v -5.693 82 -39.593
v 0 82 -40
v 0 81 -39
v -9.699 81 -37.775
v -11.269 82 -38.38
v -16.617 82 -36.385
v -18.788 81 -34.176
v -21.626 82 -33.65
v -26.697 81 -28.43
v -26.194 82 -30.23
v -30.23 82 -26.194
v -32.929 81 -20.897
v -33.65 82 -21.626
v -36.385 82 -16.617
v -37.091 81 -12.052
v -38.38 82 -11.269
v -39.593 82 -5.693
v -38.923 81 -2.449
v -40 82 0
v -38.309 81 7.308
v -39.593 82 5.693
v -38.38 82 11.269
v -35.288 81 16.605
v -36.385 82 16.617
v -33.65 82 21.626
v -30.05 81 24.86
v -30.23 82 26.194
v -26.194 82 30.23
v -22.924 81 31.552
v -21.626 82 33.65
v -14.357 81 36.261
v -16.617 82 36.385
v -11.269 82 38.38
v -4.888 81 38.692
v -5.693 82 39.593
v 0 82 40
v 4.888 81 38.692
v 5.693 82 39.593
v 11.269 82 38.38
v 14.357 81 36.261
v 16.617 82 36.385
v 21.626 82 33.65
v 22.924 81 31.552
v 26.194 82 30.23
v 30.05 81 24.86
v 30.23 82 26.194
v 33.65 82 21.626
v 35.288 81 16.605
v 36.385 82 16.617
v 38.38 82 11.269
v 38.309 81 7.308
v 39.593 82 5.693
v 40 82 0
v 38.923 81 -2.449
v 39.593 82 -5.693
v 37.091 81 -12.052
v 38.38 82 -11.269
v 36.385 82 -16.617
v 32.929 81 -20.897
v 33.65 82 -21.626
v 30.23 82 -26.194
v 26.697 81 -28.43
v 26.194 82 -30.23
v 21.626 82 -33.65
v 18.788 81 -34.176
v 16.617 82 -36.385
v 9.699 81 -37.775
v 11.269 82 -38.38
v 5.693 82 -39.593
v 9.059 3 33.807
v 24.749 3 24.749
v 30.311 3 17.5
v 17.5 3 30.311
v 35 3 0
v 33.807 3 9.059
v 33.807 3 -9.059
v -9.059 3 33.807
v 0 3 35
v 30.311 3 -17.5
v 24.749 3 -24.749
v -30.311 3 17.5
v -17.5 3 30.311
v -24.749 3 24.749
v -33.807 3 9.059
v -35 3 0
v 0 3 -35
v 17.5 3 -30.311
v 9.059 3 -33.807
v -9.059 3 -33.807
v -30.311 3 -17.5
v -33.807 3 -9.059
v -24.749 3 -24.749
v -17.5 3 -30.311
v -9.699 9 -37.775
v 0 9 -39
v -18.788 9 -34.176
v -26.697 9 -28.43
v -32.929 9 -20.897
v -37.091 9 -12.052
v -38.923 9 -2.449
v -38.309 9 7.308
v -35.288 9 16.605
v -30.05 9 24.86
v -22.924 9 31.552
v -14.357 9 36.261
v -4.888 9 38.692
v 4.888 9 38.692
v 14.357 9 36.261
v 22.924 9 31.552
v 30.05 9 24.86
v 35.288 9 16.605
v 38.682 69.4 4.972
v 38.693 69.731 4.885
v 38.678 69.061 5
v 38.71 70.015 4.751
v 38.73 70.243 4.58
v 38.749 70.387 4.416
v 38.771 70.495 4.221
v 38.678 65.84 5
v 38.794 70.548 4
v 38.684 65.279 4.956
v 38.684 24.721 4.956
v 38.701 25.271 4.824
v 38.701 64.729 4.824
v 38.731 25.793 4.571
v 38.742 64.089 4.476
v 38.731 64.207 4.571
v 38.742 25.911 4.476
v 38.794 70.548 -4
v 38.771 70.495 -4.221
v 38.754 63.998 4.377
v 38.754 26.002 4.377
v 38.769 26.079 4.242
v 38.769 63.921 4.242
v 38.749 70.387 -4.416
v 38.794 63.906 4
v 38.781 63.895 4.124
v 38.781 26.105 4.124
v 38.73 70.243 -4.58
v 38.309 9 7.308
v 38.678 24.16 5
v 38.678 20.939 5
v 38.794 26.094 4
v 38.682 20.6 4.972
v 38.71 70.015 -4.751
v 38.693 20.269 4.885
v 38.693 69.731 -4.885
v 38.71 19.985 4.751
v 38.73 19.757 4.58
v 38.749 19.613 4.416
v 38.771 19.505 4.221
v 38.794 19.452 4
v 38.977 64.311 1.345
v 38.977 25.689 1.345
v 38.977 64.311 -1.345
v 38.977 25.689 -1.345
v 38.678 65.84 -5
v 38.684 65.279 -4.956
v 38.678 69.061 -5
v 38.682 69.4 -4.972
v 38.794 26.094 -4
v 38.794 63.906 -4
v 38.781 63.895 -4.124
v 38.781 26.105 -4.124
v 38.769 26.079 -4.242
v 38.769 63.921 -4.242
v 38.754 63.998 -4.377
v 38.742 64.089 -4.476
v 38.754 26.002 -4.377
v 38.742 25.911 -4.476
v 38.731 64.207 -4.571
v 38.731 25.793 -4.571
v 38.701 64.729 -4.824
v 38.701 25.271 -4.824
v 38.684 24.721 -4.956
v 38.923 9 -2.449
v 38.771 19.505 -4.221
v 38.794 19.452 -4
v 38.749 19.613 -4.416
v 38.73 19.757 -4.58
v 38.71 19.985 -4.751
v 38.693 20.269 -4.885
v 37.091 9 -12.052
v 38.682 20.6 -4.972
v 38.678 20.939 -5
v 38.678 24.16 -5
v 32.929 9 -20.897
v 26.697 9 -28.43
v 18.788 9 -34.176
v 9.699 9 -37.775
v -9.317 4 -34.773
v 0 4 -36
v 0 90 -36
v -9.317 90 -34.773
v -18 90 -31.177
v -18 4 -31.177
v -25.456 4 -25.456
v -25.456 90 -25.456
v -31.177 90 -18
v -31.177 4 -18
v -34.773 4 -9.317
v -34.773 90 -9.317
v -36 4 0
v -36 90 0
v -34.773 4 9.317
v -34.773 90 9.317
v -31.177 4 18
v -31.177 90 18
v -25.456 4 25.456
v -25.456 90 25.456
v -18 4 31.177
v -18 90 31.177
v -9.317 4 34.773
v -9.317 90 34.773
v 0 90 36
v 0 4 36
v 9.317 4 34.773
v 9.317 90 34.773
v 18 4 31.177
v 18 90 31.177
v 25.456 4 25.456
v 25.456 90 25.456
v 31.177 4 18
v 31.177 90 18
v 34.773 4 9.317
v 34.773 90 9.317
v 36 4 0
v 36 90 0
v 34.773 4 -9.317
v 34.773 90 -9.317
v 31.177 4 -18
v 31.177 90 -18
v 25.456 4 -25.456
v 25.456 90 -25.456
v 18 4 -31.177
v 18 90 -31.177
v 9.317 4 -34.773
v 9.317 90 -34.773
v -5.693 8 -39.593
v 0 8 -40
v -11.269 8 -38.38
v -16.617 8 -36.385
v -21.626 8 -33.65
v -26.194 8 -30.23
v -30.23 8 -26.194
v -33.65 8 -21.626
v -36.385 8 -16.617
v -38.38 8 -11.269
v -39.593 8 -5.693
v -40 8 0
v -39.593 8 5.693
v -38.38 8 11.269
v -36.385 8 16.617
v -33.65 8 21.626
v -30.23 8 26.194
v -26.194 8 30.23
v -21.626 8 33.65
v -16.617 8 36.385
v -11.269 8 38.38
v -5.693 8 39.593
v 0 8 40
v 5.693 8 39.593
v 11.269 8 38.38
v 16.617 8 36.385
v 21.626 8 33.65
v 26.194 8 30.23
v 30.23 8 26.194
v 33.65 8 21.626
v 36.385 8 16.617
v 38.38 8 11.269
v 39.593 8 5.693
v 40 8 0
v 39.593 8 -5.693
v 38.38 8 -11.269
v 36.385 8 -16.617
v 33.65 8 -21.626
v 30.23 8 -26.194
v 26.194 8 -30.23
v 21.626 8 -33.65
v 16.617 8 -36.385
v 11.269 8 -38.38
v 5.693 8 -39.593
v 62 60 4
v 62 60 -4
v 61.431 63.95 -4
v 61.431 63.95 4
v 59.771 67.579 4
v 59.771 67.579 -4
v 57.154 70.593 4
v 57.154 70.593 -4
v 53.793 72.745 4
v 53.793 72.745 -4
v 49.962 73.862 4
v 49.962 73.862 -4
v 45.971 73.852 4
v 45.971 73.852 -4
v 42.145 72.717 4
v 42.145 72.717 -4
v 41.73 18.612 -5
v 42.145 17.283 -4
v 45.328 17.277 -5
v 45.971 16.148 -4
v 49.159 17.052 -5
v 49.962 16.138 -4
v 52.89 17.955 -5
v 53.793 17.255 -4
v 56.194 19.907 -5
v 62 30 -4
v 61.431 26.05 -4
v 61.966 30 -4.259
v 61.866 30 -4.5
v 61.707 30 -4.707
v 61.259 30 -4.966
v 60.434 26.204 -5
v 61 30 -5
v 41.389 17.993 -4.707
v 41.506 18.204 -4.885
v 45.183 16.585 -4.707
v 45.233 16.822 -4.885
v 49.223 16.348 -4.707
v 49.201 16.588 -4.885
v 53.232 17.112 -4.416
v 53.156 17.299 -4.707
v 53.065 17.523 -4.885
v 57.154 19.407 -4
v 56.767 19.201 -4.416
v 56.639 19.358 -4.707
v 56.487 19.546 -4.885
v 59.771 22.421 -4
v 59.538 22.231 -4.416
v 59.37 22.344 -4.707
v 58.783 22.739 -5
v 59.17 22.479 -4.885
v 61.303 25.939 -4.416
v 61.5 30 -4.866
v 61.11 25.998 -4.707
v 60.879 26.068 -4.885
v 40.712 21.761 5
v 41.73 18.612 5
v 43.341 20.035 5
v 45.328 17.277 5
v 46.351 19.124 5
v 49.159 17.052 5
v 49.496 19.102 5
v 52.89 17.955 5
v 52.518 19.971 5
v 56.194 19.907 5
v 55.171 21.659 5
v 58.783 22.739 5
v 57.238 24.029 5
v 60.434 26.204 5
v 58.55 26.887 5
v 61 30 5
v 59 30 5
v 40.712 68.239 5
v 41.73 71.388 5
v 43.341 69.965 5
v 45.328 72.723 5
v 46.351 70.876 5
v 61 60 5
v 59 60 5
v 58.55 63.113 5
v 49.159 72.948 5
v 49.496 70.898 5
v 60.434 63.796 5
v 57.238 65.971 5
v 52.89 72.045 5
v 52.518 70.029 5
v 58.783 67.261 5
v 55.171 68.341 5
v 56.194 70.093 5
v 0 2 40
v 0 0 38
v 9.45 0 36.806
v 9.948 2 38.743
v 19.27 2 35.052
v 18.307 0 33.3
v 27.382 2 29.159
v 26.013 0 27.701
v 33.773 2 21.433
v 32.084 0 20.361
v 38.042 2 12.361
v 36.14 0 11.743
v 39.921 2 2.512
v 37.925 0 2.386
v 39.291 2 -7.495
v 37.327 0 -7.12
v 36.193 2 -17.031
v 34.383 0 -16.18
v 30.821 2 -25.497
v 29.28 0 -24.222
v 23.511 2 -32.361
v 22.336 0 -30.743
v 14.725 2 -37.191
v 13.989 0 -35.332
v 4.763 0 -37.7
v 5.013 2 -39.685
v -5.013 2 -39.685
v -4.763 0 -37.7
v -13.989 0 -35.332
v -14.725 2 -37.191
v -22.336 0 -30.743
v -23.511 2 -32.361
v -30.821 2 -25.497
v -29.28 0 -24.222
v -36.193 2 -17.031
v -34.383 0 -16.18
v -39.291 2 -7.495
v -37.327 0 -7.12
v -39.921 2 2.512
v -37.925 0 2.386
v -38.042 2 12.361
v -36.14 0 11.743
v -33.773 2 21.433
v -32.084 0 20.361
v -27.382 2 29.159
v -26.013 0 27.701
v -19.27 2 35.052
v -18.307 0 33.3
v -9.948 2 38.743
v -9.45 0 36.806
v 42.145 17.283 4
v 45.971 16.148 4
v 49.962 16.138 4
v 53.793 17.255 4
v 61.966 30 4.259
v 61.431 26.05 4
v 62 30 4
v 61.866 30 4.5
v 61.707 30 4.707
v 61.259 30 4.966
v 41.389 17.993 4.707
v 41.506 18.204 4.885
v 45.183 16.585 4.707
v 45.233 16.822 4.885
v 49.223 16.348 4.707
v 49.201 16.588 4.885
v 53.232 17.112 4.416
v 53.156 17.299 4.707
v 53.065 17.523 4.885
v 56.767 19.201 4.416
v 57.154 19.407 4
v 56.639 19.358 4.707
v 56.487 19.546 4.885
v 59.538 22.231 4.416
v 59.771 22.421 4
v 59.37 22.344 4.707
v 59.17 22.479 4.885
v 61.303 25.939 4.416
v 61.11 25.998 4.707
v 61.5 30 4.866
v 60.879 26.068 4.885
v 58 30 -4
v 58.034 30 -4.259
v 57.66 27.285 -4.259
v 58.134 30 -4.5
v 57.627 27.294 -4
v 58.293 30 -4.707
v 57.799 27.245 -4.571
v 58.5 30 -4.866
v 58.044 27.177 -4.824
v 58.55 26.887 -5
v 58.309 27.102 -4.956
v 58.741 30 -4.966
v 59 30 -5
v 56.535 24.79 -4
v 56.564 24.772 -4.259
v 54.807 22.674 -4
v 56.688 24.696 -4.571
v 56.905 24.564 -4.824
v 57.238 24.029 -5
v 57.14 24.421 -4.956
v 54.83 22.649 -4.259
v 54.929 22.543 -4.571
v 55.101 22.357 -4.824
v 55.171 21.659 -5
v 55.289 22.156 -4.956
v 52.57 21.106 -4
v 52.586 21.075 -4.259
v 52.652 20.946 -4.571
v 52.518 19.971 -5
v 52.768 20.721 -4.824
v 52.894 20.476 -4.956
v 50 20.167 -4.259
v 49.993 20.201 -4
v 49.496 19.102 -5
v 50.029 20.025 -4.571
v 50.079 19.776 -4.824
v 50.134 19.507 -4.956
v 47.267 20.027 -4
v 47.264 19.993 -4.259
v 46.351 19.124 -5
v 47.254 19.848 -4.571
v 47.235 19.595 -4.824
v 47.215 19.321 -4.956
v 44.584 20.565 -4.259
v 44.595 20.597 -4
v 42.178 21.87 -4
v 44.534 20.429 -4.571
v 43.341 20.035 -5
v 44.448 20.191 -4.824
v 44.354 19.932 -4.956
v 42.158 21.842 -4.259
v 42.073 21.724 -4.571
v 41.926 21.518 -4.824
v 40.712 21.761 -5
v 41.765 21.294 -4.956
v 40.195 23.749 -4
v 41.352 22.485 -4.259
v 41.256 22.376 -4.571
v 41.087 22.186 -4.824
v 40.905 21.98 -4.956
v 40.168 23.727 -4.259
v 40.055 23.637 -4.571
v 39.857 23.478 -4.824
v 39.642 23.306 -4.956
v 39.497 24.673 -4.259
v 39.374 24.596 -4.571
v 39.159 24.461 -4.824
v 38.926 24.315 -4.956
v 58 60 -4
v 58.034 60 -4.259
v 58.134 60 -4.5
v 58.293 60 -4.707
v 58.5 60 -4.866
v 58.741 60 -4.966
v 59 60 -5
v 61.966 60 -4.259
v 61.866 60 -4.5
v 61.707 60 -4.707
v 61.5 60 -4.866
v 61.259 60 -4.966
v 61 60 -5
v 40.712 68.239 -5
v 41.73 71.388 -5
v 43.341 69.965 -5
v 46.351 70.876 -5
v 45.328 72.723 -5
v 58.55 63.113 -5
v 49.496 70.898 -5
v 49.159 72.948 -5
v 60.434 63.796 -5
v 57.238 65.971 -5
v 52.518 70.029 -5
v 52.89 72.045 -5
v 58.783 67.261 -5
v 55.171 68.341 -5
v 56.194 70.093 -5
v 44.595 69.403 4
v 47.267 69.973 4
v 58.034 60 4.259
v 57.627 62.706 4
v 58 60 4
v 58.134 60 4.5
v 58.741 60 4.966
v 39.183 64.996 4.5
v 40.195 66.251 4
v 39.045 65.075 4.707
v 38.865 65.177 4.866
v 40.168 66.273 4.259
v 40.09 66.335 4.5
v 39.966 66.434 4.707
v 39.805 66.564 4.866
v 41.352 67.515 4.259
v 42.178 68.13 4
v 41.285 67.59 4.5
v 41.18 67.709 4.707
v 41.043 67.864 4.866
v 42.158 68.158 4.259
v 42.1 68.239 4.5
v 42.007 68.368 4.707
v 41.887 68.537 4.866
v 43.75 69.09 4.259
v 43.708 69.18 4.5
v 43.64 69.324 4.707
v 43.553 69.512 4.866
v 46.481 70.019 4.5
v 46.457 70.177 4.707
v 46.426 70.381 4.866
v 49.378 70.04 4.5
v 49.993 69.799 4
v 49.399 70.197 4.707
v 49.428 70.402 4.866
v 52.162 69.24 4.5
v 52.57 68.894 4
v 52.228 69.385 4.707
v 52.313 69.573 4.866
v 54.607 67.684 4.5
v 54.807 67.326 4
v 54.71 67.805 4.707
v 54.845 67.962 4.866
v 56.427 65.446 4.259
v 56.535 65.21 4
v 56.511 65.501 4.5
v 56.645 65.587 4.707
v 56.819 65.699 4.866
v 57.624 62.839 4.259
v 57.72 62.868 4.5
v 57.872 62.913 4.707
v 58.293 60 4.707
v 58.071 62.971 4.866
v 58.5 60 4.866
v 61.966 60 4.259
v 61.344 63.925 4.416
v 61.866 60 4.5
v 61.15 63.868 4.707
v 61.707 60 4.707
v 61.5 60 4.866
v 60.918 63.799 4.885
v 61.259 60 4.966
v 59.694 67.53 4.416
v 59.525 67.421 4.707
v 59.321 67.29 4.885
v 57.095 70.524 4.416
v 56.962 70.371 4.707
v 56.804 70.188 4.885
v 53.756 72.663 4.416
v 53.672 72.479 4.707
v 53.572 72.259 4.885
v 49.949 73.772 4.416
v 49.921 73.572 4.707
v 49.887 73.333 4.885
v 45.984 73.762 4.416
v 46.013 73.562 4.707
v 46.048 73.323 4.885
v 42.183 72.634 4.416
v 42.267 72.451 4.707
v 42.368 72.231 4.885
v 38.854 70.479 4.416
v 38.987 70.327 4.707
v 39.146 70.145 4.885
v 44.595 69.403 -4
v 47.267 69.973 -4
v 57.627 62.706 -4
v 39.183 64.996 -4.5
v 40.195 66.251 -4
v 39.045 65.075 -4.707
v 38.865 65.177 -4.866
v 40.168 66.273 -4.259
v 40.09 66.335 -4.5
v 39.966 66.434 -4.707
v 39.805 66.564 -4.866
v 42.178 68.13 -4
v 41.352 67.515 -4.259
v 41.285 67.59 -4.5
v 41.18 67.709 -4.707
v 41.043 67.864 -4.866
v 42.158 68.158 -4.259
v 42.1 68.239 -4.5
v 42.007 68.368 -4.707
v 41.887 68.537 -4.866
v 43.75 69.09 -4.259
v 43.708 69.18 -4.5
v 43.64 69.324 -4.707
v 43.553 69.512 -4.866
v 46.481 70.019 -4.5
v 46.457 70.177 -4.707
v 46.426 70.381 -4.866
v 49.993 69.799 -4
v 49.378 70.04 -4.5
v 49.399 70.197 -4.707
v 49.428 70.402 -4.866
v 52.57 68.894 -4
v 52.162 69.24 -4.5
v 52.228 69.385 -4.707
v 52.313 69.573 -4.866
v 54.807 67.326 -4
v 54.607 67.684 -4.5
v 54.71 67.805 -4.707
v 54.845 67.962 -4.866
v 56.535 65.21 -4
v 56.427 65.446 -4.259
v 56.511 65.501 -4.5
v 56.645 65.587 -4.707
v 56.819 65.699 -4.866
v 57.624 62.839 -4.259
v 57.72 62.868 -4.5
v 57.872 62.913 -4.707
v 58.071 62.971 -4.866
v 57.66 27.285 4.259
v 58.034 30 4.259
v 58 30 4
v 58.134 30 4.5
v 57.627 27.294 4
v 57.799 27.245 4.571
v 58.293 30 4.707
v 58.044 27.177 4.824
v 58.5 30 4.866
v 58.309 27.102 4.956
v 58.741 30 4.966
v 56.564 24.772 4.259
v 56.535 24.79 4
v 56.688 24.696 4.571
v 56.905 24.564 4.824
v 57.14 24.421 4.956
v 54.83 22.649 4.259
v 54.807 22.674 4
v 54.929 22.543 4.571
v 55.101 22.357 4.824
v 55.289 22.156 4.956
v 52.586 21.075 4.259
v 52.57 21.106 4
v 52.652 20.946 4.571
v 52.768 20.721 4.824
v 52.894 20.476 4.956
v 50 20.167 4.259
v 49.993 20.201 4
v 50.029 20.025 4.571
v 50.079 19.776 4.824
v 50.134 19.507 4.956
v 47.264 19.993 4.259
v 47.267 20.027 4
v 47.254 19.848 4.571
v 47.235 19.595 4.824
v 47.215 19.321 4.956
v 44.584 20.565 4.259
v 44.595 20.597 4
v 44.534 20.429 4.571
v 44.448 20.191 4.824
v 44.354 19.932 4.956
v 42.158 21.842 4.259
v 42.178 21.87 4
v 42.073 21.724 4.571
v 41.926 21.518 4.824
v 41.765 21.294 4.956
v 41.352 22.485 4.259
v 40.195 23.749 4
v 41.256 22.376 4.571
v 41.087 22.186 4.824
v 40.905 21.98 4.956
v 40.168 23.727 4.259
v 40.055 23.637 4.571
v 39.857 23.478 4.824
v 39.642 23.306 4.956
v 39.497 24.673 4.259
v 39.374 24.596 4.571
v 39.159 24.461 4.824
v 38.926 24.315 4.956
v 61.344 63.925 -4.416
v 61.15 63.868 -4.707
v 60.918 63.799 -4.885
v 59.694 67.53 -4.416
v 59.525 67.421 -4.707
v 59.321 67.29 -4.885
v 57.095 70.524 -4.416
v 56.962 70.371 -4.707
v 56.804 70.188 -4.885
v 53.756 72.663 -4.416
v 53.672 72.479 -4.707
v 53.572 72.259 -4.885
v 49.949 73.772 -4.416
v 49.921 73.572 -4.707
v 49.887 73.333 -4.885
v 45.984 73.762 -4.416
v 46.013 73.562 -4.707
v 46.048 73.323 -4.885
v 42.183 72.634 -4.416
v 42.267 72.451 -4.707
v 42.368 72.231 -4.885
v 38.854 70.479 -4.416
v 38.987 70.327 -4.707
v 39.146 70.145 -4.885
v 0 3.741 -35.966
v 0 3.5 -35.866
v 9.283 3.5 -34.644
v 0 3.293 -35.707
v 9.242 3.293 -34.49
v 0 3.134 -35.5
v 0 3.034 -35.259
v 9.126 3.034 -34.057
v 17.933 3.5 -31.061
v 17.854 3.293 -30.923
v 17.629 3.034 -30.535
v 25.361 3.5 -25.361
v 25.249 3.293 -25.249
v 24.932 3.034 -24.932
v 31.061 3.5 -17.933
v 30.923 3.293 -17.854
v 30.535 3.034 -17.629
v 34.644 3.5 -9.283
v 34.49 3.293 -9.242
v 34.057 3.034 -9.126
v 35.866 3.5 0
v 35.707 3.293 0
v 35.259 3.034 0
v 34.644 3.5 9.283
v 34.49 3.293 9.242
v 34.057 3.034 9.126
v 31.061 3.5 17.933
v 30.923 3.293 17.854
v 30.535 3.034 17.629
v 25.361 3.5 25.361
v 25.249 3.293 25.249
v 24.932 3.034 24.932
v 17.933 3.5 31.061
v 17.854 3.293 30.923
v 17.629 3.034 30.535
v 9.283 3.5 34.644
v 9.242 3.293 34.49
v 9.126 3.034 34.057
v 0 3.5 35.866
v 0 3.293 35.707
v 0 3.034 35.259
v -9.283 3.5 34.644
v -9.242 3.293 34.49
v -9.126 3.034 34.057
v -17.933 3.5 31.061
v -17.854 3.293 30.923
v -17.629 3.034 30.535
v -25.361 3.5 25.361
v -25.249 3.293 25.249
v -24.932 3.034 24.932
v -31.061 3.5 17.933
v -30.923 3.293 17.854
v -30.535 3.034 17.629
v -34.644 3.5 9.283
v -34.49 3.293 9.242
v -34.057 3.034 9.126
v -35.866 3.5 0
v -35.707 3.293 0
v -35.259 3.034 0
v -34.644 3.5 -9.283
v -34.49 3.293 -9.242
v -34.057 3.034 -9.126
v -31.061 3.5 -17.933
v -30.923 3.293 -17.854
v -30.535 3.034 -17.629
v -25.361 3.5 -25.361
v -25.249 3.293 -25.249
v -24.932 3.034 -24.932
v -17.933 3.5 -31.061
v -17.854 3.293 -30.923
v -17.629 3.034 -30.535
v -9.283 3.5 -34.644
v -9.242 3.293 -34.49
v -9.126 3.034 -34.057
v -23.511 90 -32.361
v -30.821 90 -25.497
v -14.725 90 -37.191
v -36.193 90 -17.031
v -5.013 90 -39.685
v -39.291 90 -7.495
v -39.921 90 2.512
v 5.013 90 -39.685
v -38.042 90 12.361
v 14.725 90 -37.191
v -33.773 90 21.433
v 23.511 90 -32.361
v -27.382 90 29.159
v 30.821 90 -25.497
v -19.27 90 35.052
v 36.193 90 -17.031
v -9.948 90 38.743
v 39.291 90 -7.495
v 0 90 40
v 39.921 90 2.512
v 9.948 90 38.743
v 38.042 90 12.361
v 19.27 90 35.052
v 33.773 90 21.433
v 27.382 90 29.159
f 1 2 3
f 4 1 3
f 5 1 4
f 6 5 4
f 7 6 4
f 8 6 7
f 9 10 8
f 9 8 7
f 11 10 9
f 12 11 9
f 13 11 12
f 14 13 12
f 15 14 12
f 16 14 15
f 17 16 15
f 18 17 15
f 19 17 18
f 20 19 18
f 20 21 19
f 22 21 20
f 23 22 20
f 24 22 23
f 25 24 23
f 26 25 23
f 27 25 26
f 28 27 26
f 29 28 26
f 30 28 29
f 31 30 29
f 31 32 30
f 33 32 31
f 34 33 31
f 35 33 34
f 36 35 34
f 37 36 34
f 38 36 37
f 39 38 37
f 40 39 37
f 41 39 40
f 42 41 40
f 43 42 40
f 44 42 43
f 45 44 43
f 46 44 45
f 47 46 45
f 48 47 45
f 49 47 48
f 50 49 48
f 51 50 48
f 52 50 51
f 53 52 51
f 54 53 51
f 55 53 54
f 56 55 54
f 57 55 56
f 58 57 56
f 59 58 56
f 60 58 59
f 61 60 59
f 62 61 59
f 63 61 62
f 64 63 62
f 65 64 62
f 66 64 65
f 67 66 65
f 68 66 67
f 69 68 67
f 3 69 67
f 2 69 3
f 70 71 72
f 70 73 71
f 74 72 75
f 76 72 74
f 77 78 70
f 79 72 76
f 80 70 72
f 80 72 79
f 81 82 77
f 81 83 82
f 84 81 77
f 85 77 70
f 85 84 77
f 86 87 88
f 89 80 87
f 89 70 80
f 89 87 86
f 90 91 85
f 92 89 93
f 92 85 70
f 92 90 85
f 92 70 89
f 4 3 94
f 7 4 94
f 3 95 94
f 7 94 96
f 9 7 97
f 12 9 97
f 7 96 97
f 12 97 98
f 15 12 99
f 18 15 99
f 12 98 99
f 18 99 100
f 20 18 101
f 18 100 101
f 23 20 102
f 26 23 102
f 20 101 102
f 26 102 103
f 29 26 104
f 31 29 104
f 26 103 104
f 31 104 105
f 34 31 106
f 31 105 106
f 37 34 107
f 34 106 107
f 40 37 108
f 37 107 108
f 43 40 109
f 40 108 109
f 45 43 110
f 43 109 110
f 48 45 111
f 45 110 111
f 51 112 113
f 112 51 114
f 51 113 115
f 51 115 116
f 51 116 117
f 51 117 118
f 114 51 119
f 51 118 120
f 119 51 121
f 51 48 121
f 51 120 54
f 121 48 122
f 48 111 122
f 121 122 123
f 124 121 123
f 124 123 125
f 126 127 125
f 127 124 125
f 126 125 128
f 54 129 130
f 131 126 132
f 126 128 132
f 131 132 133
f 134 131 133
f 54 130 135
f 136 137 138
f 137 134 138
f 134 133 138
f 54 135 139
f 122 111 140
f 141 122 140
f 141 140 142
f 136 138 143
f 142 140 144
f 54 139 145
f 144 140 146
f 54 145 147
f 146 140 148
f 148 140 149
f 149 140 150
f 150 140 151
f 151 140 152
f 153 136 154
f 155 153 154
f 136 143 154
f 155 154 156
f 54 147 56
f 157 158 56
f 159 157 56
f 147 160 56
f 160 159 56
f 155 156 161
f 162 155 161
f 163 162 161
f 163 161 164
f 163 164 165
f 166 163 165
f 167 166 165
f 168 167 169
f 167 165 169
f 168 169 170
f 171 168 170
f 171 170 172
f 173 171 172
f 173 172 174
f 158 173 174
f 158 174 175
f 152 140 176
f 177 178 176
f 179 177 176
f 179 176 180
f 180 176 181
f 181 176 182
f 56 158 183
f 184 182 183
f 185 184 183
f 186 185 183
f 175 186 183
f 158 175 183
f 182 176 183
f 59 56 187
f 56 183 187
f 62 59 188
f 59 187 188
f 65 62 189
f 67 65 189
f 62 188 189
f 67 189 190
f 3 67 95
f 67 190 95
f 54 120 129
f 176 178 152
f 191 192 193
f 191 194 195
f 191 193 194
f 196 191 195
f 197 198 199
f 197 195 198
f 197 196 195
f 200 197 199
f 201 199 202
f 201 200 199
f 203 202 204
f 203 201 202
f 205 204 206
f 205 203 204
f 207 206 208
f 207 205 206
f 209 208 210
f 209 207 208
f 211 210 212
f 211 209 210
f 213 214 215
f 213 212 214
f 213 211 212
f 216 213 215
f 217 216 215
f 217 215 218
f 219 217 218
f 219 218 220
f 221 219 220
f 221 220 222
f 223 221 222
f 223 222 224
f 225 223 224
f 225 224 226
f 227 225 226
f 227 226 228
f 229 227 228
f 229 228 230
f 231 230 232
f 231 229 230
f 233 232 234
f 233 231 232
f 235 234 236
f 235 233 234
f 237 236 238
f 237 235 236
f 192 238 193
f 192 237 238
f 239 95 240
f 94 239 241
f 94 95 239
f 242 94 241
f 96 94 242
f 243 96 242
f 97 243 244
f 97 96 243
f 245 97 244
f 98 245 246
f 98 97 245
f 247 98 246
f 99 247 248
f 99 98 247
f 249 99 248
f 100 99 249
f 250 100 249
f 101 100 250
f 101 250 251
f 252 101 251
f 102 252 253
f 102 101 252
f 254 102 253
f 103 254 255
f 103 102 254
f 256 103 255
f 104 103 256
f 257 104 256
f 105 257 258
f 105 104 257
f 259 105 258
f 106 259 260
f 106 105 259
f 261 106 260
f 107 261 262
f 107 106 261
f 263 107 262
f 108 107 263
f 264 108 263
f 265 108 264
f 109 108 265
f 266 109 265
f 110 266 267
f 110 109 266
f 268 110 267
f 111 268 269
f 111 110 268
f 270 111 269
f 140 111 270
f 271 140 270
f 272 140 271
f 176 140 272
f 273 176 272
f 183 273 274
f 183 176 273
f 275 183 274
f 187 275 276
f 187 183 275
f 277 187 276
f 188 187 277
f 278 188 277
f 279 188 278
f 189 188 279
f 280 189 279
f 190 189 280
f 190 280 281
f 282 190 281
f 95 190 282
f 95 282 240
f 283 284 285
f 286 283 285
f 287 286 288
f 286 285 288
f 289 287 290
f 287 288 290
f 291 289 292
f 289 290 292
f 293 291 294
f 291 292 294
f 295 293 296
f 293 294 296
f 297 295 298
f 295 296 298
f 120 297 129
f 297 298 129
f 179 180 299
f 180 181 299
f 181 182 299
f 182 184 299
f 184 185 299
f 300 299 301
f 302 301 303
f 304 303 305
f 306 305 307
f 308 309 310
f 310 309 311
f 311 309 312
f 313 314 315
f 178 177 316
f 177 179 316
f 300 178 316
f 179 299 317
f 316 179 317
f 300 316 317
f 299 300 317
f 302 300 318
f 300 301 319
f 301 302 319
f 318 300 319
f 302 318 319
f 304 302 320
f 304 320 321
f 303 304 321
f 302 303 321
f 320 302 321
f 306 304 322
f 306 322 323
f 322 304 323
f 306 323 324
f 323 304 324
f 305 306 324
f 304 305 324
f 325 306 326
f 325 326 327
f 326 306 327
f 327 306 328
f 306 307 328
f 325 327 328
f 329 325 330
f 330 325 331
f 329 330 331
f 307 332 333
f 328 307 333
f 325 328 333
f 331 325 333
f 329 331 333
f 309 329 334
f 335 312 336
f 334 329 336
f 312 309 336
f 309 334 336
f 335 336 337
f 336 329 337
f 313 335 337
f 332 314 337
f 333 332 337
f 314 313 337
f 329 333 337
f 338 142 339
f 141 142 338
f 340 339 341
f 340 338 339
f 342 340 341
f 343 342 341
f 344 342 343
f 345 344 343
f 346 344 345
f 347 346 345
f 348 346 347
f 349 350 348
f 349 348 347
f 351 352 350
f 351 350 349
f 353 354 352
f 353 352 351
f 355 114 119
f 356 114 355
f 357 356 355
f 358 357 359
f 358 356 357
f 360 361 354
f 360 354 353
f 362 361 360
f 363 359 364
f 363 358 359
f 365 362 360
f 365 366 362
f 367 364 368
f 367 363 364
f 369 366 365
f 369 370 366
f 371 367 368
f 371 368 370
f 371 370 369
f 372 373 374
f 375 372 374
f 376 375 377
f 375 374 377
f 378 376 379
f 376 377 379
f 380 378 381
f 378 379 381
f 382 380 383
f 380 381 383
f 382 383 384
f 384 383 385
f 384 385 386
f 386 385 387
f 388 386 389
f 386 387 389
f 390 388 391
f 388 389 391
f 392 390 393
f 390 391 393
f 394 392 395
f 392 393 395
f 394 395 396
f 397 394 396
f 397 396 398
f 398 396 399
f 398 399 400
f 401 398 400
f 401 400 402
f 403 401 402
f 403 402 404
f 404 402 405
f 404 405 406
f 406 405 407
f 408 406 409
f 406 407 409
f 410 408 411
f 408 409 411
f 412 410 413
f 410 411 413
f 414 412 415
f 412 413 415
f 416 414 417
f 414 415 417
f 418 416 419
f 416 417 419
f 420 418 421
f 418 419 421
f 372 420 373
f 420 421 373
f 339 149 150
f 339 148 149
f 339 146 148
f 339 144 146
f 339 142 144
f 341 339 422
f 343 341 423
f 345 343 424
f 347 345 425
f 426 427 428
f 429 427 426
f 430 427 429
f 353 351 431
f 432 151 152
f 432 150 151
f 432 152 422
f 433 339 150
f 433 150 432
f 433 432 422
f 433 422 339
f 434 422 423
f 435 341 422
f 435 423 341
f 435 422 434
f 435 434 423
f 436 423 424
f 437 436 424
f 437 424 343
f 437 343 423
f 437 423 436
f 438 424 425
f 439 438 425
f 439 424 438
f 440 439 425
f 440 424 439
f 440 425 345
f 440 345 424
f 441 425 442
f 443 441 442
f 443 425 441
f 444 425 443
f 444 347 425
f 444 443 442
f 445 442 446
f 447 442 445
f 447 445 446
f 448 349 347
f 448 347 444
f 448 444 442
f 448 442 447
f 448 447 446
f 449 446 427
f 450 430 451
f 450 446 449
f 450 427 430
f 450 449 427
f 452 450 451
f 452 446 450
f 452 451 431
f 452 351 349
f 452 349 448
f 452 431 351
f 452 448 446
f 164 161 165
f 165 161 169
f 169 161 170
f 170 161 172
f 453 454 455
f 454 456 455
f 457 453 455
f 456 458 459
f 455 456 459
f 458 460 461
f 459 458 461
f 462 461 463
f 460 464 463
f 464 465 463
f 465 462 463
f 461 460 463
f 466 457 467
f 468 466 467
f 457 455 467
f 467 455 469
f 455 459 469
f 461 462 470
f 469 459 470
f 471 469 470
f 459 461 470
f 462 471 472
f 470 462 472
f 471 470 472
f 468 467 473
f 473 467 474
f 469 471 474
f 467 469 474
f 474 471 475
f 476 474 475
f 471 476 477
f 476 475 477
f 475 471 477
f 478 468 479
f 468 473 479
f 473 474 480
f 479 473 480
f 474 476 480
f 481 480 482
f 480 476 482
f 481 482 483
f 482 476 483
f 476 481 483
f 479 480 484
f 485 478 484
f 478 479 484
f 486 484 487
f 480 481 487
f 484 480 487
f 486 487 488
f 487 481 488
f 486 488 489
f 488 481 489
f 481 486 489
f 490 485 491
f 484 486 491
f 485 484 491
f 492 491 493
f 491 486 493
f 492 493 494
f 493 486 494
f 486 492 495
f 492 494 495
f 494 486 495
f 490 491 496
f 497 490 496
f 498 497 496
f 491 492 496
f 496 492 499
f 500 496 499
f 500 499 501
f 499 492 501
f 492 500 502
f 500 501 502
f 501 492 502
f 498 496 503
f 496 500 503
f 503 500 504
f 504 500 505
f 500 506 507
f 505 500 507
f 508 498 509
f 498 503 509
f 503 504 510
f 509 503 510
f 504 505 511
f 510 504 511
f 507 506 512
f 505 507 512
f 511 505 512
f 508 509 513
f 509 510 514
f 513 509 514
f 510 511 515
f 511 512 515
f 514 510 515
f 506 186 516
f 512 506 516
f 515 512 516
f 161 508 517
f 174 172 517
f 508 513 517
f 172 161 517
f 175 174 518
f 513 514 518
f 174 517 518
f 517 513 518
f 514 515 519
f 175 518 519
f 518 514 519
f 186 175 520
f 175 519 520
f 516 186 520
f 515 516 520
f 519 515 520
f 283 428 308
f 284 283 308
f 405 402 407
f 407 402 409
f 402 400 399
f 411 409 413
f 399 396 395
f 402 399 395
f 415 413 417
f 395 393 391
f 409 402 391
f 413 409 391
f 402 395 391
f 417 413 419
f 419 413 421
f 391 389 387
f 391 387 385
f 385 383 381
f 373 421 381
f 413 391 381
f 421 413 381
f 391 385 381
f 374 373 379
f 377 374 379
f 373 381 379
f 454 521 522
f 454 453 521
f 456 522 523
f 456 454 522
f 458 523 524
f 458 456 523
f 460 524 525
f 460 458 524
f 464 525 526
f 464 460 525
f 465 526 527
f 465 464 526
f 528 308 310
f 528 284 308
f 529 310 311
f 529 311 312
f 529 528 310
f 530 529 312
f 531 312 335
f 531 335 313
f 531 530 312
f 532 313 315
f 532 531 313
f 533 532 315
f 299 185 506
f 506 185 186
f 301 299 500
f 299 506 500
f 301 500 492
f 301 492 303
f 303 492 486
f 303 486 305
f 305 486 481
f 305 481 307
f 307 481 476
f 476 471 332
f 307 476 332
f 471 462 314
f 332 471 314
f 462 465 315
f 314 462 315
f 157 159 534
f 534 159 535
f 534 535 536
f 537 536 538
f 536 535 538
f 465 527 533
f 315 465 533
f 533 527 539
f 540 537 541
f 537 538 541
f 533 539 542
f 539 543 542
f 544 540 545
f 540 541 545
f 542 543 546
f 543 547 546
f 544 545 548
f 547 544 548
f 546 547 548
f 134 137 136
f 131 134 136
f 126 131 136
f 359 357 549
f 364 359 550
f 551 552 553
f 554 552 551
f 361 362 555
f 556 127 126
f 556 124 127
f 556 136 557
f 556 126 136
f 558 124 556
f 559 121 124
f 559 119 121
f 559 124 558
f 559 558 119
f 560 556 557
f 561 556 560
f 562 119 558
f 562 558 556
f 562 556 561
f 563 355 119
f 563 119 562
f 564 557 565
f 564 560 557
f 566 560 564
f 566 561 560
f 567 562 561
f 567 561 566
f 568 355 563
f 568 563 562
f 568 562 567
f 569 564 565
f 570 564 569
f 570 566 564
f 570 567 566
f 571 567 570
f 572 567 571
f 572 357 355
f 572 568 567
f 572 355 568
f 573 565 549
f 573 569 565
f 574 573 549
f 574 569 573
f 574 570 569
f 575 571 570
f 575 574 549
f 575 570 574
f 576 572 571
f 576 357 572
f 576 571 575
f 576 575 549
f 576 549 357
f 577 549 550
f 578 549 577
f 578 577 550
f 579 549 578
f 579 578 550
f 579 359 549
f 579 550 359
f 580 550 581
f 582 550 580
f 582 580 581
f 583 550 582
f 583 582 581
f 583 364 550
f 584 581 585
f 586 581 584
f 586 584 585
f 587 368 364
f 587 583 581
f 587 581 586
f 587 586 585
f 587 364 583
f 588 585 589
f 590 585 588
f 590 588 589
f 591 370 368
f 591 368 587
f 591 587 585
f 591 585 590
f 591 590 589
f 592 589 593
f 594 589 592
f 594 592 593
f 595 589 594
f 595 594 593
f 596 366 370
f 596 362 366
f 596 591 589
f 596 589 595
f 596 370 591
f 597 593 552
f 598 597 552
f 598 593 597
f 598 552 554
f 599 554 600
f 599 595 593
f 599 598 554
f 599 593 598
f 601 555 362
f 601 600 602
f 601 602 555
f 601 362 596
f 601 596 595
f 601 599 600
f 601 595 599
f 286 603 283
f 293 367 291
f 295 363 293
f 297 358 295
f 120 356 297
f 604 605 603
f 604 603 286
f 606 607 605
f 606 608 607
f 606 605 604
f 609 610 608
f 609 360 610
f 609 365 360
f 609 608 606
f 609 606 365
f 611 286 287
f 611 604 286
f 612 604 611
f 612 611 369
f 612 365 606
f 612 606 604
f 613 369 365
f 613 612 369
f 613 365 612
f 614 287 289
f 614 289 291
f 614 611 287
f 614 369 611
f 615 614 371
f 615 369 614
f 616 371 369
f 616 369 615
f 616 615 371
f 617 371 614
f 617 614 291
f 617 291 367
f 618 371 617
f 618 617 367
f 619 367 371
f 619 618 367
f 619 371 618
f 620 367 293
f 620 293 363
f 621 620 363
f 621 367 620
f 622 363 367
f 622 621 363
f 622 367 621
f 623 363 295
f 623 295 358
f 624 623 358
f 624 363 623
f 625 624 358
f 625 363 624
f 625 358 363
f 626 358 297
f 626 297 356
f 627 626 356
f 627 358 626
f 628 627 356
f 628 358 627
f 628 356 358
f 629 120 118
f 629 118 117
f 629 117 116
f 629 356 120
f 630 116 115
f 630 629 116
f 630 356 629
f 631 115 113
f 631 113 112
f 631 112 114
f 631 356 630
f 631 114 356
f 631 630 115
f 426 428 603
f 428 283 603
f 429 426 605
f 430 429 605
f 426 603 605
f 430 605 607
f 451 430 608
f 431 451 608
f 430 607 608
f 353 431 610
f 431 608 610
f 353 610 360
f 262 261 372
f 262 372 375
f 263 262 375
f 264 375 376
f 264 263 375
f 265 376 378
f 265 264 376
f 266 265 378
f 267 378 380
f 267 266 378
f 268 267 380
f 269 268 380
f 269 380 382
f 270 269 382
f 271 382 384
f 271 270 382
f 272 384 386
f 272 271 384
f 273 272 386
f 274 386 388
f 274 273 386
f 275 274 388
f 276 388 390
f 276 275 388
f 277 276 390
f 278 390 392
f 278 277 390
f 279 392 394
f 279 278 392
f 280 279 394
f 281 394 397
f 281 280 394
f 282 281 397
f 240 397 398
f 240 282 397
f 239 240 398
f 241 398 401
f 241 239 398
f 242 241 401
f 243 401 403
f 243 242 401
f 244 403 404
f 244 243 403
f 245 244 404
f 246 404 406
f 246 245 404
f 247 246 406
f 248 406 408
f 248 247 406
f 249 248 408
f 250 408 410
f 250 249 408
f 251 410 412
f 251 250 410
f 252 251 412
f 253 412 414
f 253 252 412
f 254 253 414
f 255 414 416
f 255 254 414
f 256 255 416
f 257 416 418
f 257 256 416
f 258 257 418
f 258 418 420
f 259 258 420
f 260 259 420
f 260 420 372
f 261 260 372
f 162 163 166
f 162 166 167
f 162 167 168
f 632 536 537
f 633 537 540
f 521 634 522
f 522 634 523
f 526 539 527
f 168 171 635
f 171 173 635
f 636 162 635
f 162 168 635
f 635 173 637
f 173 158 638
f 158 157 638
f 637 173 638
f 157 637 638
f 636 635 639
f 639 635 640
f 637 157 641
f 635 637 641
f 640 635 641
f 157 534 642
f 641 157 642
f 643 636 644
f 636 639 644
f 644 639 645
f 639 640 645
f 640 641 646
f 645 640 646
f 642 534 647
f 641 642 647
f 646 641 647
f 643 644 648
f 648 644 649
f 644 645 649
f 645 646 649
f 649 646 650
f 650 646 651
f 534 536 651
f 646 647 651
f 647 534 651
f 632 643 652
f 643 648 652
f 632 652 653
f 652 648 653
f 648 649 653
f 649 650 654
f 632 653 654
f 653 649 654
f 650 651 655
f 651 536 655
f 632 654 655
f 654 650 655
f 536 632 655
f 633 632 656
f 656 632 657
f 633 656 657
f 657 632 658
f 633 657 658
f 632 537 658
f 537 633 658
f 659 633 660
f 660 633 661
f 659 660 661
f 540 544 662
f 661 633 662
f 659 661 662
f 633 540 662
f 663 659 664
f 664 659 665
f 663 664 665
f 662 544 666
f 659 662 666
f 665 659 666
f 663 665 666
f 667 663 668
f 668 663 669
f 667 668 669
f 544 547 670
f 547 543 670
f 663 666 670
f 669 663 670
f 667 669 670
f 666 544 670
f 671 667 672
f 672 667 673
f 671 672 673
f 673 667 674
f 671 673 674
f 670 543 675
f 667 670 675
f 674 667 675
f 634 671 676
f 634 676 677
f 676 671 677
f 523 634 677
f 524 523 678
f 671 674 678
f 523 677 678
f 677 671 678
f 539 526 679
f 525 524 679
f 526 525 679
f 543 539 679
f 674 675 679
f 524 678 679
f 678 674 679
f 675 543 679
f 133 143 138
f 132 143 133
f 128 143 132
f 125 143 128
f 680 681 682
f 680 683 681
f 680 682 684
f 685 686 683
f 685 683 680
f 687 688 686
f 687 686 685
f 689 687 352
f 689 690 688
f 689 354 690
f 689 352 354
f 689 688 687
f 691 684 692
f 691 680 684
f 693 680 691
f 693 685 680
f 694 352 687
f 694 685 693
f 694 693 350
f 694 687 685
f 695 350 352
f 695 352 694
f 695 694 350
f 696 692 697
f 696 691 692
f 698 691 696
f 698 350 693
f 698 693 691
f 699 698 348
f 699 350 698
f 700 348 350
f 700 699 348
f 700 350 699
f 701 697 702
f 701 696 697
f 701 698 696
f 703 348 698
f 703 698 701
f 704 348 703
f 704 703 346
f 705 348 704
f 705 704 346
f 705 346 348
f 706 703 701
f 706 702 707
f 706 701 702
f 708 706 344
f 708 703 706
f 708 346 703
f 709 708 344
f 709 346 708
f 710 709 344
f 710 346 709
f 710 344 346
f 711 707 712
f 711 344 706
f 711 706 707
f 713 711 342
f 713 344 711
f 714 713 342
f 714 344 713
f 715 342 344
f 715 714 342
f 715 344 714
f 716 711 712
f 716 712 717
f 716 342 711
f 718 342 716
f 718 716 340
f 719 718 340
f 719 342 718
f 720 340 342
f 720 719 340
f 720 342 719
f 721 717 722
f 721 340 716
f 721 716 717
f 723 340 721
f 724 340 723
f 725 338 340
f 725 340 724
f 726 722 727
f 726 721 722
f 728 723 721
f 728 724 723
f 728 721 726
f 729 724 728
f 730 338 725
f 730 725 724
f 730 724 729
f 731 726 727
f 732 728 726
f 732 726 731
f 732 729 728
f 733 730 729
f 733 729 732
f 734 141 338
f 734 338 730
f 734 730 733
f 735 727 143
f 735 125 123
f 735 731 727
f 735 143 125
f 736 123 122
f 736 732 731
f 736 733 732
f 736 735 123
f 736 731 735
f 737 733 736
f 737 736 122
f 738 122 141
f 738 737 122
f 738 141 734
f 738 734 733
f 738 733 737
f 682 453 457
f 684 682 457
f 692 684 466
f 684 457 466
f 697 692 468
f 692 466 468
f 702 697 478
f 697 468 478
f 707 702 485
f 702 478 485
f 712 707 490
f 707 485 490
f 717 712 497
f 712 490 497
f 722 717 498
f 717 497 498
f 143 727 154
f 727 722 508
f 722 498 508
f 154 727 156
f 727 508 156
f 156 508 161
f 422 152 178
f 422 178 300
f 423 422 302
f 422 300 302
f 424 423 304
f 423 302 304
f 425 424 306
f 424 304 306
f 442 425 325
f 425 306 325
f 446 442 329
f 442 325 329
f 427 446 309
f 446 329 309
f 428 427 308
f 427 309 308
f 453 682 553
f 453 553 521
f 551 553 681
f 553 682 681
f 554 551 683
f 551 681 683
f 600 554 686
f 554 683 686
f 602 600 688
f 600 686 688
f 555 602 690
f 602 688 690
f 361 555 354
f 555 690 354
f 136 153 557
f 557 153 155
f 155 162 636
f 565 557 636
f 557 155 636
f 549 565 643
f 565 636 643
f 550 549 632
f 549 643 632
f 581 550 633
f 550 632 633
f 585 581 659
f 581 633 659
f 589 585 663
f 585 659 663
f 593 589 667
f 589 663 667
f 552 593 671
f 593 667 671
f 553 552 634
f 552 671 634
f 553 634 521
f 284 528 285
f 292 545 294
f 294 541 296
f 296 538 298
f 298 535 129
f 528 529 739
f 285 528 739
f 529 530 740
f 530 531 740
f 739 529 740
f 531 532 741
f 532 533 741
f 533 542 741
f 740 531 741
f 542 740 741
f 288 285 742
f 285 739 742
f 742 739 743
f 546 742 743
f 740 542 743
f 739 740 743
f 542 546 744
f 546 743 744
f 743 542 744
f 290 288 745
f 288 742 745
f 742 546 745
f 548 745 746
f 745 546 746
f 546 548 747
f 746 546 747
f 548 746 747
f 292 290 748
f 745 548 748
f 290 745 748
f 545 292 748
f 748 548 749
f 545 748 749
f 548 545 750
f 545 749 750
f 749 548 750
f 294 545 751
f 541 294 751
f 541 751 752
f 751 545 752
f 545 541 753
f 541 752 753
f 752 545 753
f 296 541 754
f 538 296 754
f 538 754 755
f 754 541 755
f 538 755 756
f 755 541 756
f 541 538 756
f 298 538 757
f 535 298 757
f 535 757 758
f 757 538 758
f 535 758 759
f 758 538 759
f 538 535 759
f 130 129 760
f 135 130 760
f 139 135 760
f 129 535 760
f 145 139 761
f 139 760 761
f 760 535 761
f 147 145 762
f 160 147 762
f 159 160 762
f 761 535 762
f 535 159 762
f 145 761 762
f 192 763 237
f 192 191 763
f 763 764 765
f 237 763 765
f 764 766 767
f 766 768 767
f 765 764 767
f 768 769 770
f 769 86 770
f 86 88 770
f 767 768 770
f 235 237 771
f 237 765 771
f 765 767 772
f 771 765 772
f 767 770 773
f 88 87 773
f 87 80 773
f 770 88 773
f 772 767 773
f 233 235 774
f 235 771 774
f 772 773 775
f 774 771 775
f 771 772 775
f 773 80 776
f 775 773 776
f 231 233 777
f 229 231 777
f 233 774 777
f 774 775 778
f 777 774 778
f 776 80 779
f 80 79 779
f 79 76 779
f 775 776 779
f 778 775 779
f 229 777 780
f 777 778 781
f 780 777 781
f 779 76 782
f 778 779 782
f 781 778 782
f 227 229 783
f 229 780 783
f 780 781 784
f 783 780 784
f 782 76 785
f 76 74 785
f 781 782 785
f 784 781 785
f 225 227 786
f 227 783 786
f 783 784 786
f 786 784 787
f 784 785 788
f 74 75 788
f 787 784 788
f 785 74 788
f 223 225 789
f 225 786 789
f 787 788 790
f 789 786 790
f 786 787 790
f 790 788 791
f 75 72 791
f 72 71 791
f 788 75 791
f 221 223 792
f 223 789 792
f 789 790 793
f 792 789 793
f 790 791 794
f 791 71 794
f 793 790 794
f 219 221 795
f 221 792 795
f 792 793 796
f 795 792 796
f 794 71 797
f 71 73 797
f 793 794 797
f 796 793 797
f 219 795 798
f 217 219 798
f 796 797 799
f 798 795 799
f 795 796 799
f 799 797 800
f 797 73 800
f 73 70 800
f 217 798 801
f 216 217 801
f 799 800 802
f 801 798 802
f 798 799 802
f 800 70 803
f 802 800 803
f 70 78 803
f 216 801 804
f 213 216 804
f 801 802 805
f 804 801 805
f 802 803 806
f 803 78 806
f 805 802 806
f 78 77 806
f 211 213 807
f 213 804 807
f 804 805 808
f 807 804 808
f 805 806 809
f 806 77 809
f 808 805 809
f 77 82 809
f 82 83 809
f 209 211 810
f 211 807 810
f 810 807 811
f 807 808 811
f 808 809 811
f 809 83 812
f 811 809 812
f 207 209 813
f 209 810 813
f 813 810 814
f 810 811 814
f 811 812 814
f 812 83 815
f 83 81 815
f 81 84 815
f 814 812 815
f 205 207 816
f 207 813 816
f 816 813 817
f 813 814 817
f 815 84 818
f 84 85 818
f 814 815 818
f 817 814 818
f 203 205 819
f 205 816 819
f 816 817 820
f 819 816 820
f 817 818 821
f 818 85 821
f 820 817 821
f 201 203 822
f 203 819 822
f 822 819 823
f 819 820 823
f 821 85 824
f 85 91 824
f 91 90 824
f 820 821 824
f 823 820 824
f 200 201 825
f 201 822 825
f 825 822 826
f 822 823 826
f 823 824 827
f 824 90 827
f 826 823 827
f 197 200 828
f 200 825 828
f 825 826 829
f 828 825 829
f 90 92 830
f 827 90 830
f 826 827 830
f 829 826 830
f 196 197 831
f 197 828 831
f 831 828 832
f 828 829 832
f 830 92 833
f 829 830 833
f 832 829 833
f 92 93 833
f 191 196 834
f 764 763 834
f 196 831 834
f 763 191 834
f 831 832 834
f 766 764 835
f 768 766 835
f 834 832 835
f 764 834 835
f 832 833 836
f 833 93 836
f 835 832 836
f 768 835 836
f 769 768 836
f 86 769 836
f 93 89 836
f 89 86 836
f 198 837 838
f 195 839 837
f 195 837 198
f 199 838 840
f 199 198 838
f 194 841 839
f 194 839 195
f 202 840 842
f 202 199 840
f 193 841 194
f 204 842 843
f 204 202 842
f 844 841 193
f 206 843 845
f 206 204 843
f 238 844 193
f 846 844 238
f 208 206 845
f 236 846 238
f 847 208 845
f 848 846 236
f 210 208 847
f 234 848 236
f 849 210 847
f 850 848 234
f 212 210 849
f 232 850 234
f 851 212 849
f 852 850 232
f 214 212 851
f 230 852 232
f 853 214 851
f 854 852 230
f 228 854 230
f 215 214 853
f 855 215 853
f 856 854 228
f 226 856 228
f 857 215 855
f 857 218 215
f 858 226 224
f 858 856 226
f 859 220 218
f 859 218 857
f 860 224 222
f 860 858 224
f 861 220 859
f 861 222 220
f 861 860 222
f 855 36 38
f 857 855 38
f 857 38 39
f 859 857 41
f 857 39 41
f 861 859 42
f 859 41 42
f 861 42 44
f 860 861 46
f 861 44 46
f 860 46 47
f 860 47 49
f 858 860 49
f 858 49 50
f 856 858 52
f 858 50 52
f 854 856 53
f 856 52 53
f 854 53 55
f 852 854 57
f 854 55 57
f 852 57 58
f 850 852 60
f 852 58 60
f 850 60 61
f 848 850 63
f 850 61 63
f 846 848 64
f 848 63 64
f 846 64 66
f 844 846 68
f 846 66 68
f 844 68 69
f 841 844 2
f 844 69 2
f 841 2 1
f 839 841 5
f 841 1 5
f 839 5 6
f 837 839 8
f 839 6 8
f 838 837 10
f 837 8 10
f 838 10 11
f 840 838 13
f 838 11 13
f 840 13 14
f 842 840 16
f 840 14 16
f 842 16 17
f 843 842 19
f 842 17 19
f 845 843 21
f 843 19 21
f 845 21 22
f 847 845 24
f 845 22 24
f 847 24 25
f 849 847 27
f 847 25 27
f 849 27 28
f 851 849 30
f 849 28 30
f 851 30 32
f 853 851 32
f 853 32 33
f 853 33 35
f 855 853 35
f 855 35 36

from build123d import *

# Parameters (mm, degrees)
SKETCH1_R               = 39
BOSS_EXTRUDE1_DEPTH     = 90
SHELL3_T                = -3
BOSS_EXTRUDE3_START     = -8
SKETCH6_R               = 40
SKETCH6_R_2             = 39
BOSS_EXTRUDE3_DEPTH     = 8
CHAMFER2_SIZE           = 2
CHAMFER3_SIZE           = 1
CHAMFER4_SIZE           = 1
BOSS_EXTRUDE8_START     = 30
BOSS_EXTRUDE8_OUTLINE_W = 4
BOSS_EXTRUDE8_OUTLINE_H = 10
BOSS_EXTRUDE8_DEPTH     = 29.9999999
BOSS_EXTRUDE8_START_2   = -5
BOSS_EXTRUDE8_2_DEPTH   = 10
CUT_EXTRUDE3_START      = -70
SKETCH11_R              = 36
CUT_EXTRUDE3_DEPTH      = 70
FILLET4_R               = 1
FILLET5_R               = 1


with BuildPart() as part:
    # Sketch1 → Boss-Extrude1 (new body)
    with BuildSketch(Plane(origin=(0, 0, 0), x_dir=(1, 0, 0), z_dir=(0, 1, 0))):
        with Locations(Location((0, 0, 0), (0, 0, 90))):
            Circle(SKETCH1_R)
    extrude(amount=BOSS_EXTRUDE1_DEPTH)

    # Shell3
    shell3_openings = [part.faces().sort_by_distance(p)[0] for p in [
        (0, 90, 0),
    ]]
    offset(amount=SHELL3_T, openings=shell3_openings, kind=Kind.INTERSECTION)

    # Sketch6 → Boss-Extrude3 (add)
    with BuildSketch(Plane(origin=(0, 90, 0), x_dir=(1, 0, 0), z_dir=(0, 1, 0)).offset(BOSS_EXTRUDE3_START)):
        with Locations(Location((0, 0, 0), (0, 0, 270))):
            Circle(SKETCH6_R)
        with Locations(Location((0, 0, 0), (0, 0, 90))):
            Circle(SKETCH6_R_2, mode=Mode.SUBTRACT)
    boss_extrude3 = extrude(amount=BOSS_EXTRUDE3_DEPTH)

    # Mirror1: Boss-Extrude3 across plane
    add(boss_extrude3.mirror(Plane.ZX.offset(45)))

    # Chamfer2
    chamfer2_edges = [part.edges().sort_by_distance(p)[0] for p in [
        (0, 0, -40),
    ]]
    chamfer(chamfer2_edges, length=CHAMFER2_SIZE)

    # Chamfer3
    chamfer3_edges = [part.edges().sort_by_distance(p)[0] for p in [
        (0, 8, 39),
    ]]
    chamfer(chamfer3_edges, length=CHAMFER3_SIZE - 0.0001)  # a hair under: the kernel refuses the full size

    # Chamfer4
    chamfer4_edges = [part.edges().sort_by_distance(p)[0] for p in [
        (0, 82, 39),
    ]]
    chamfer(chamfer4_edges, length=CHAMFER4_SIZE - 0.0001)  # a hair under: the kernel refuses the full size

    # Boss-Extrude8: read off the stored shape, not the designer's step
    # Boss-Extrude8 outline → Boss-Extrude8 (add)
    with BuildSketch(Plane(origin=(0, 0, 0), x_dir=(1, 0, 0), z_dir=(0, 1, 0)).offset(BOSS_EXTRUDE8_START)):
        with BuildLine():
            Line((35.65108694, 5), (34, 5))
            Line((34, 5), (34, -5))
            Line((34, -5), (35.65108694, -5))
            ThreePointArc((35.65108694, -5), (36, 0), (35.65108694, 5))
        make_face()
        with Locations((60, 0)):
            Rectangle(BOSS_EXTRUDE8_OUTLINE_W, BOSS_EXTRUDE8_OUTLINE_H)
    extrude(amount=BOSS_EXTRUDE8_DEPTH)

    # Boss-Extrude8 2 outline → Boss-Extrude8 2 (add)
    with BuildSketch(Plane.XY.offset(BOSS_EXTRUDE8_START_2)):
        with BuildLine():
            Line((37.272505048, 30), (34, 30))
            ThreePointArc((34, 30), (34.509326065, 26.258113205), (36.000245256, 22.788489335))
            Line((36.000245256, 22.788489335), (37.093979465, 20.968545795))
            Line((37.093979465, 20.968545795), (38.678159212, 19.554748241))
            ThreePointArc((38.678159212, 19.554748241), (53.722509457, 17.222954742), (62, 30))
            Line((62, 30), (58, 30))
            ThreePointArc((58, 30), (49.841411431, 20.171001885), (38.678159212, 26.380154103))
            Line((38.678159212, 26.380154103), (37.272505048, 30))
        make_face()
        with BuildLine():
            Line((34, 60), (37.27250501, 59.9999999))
            Line((37.27250501, 59.9999999), (38.678159212, 63.619845897))
            ThreePointArc((38.678159212, 63.619845897), (49.841411431, 69.828998115), (58, 60))
            Line((58, 60), (62, 60))
            ThreePointArc((62, 60), (53.722509457, 72.777045258), (38.678159212, 70.445251759))
            Line((38.678159212, 70.445251759), (37.094524497, 69.031940618))
            Line((37.094524497, 69.031940618), (36.000980999, 67.212734781))
            ThreePointArc((36.000980999, 67.212734781), (34.509516947, 63.742574915), (34, 60))
        make_face()
    extrude(amount=BOSS_EXTRUDE8_2_DEPTH)

    # Sketch11 → Cut-Extrude3 (cut)
    with BuildSketch(Plane(origin=(0, 90, 0), x_dir=(1, 0, 0), z_dir=(0, 1, 0)).offset(CUT_EXTRUDE3_START)):
        with Locations(Location((0, 0, 0), (0, 0, 90))):
            Circle(SKETCH11_R)
    extrude(amount=CUT_EXTRUDE3_DEPTH, mode=Mode.SUBTRACT)

    # Fillet4
    fillet4_edges = [part.edges().sort_by_distance(p)[0] for p in [
        (49.841411431, 69.828998115, -5),
        (58, 44.99999995, -5),
        (53.722509457, 17.222954742, -5),
        (53.722509457, 72.777045258, -5),
        (49.841411431, 20.171001885, 5),
        (49.841411431, 69.828998115, 5),
        (53.722509457, 17.222954742, 5),
        (53.722509457, 72.777045258, 5),
        (49.841411431, 20.171001885, -5),
        (62, 44.99999995, -5),
        (58, 44.99999995, 5),
        (62, 44.99999995, 5),
    ]]
    fillet(fillet4_edges, radius=FILLET4_R)

    # Fillet5
    fillet5_edges = [part.edges().sort_by_distance(p)[0] for p in [
        (0, 3, 36),
    ]]
    fillet(fillet5_edges, radius=FILLET5_R)


solid = part.part
